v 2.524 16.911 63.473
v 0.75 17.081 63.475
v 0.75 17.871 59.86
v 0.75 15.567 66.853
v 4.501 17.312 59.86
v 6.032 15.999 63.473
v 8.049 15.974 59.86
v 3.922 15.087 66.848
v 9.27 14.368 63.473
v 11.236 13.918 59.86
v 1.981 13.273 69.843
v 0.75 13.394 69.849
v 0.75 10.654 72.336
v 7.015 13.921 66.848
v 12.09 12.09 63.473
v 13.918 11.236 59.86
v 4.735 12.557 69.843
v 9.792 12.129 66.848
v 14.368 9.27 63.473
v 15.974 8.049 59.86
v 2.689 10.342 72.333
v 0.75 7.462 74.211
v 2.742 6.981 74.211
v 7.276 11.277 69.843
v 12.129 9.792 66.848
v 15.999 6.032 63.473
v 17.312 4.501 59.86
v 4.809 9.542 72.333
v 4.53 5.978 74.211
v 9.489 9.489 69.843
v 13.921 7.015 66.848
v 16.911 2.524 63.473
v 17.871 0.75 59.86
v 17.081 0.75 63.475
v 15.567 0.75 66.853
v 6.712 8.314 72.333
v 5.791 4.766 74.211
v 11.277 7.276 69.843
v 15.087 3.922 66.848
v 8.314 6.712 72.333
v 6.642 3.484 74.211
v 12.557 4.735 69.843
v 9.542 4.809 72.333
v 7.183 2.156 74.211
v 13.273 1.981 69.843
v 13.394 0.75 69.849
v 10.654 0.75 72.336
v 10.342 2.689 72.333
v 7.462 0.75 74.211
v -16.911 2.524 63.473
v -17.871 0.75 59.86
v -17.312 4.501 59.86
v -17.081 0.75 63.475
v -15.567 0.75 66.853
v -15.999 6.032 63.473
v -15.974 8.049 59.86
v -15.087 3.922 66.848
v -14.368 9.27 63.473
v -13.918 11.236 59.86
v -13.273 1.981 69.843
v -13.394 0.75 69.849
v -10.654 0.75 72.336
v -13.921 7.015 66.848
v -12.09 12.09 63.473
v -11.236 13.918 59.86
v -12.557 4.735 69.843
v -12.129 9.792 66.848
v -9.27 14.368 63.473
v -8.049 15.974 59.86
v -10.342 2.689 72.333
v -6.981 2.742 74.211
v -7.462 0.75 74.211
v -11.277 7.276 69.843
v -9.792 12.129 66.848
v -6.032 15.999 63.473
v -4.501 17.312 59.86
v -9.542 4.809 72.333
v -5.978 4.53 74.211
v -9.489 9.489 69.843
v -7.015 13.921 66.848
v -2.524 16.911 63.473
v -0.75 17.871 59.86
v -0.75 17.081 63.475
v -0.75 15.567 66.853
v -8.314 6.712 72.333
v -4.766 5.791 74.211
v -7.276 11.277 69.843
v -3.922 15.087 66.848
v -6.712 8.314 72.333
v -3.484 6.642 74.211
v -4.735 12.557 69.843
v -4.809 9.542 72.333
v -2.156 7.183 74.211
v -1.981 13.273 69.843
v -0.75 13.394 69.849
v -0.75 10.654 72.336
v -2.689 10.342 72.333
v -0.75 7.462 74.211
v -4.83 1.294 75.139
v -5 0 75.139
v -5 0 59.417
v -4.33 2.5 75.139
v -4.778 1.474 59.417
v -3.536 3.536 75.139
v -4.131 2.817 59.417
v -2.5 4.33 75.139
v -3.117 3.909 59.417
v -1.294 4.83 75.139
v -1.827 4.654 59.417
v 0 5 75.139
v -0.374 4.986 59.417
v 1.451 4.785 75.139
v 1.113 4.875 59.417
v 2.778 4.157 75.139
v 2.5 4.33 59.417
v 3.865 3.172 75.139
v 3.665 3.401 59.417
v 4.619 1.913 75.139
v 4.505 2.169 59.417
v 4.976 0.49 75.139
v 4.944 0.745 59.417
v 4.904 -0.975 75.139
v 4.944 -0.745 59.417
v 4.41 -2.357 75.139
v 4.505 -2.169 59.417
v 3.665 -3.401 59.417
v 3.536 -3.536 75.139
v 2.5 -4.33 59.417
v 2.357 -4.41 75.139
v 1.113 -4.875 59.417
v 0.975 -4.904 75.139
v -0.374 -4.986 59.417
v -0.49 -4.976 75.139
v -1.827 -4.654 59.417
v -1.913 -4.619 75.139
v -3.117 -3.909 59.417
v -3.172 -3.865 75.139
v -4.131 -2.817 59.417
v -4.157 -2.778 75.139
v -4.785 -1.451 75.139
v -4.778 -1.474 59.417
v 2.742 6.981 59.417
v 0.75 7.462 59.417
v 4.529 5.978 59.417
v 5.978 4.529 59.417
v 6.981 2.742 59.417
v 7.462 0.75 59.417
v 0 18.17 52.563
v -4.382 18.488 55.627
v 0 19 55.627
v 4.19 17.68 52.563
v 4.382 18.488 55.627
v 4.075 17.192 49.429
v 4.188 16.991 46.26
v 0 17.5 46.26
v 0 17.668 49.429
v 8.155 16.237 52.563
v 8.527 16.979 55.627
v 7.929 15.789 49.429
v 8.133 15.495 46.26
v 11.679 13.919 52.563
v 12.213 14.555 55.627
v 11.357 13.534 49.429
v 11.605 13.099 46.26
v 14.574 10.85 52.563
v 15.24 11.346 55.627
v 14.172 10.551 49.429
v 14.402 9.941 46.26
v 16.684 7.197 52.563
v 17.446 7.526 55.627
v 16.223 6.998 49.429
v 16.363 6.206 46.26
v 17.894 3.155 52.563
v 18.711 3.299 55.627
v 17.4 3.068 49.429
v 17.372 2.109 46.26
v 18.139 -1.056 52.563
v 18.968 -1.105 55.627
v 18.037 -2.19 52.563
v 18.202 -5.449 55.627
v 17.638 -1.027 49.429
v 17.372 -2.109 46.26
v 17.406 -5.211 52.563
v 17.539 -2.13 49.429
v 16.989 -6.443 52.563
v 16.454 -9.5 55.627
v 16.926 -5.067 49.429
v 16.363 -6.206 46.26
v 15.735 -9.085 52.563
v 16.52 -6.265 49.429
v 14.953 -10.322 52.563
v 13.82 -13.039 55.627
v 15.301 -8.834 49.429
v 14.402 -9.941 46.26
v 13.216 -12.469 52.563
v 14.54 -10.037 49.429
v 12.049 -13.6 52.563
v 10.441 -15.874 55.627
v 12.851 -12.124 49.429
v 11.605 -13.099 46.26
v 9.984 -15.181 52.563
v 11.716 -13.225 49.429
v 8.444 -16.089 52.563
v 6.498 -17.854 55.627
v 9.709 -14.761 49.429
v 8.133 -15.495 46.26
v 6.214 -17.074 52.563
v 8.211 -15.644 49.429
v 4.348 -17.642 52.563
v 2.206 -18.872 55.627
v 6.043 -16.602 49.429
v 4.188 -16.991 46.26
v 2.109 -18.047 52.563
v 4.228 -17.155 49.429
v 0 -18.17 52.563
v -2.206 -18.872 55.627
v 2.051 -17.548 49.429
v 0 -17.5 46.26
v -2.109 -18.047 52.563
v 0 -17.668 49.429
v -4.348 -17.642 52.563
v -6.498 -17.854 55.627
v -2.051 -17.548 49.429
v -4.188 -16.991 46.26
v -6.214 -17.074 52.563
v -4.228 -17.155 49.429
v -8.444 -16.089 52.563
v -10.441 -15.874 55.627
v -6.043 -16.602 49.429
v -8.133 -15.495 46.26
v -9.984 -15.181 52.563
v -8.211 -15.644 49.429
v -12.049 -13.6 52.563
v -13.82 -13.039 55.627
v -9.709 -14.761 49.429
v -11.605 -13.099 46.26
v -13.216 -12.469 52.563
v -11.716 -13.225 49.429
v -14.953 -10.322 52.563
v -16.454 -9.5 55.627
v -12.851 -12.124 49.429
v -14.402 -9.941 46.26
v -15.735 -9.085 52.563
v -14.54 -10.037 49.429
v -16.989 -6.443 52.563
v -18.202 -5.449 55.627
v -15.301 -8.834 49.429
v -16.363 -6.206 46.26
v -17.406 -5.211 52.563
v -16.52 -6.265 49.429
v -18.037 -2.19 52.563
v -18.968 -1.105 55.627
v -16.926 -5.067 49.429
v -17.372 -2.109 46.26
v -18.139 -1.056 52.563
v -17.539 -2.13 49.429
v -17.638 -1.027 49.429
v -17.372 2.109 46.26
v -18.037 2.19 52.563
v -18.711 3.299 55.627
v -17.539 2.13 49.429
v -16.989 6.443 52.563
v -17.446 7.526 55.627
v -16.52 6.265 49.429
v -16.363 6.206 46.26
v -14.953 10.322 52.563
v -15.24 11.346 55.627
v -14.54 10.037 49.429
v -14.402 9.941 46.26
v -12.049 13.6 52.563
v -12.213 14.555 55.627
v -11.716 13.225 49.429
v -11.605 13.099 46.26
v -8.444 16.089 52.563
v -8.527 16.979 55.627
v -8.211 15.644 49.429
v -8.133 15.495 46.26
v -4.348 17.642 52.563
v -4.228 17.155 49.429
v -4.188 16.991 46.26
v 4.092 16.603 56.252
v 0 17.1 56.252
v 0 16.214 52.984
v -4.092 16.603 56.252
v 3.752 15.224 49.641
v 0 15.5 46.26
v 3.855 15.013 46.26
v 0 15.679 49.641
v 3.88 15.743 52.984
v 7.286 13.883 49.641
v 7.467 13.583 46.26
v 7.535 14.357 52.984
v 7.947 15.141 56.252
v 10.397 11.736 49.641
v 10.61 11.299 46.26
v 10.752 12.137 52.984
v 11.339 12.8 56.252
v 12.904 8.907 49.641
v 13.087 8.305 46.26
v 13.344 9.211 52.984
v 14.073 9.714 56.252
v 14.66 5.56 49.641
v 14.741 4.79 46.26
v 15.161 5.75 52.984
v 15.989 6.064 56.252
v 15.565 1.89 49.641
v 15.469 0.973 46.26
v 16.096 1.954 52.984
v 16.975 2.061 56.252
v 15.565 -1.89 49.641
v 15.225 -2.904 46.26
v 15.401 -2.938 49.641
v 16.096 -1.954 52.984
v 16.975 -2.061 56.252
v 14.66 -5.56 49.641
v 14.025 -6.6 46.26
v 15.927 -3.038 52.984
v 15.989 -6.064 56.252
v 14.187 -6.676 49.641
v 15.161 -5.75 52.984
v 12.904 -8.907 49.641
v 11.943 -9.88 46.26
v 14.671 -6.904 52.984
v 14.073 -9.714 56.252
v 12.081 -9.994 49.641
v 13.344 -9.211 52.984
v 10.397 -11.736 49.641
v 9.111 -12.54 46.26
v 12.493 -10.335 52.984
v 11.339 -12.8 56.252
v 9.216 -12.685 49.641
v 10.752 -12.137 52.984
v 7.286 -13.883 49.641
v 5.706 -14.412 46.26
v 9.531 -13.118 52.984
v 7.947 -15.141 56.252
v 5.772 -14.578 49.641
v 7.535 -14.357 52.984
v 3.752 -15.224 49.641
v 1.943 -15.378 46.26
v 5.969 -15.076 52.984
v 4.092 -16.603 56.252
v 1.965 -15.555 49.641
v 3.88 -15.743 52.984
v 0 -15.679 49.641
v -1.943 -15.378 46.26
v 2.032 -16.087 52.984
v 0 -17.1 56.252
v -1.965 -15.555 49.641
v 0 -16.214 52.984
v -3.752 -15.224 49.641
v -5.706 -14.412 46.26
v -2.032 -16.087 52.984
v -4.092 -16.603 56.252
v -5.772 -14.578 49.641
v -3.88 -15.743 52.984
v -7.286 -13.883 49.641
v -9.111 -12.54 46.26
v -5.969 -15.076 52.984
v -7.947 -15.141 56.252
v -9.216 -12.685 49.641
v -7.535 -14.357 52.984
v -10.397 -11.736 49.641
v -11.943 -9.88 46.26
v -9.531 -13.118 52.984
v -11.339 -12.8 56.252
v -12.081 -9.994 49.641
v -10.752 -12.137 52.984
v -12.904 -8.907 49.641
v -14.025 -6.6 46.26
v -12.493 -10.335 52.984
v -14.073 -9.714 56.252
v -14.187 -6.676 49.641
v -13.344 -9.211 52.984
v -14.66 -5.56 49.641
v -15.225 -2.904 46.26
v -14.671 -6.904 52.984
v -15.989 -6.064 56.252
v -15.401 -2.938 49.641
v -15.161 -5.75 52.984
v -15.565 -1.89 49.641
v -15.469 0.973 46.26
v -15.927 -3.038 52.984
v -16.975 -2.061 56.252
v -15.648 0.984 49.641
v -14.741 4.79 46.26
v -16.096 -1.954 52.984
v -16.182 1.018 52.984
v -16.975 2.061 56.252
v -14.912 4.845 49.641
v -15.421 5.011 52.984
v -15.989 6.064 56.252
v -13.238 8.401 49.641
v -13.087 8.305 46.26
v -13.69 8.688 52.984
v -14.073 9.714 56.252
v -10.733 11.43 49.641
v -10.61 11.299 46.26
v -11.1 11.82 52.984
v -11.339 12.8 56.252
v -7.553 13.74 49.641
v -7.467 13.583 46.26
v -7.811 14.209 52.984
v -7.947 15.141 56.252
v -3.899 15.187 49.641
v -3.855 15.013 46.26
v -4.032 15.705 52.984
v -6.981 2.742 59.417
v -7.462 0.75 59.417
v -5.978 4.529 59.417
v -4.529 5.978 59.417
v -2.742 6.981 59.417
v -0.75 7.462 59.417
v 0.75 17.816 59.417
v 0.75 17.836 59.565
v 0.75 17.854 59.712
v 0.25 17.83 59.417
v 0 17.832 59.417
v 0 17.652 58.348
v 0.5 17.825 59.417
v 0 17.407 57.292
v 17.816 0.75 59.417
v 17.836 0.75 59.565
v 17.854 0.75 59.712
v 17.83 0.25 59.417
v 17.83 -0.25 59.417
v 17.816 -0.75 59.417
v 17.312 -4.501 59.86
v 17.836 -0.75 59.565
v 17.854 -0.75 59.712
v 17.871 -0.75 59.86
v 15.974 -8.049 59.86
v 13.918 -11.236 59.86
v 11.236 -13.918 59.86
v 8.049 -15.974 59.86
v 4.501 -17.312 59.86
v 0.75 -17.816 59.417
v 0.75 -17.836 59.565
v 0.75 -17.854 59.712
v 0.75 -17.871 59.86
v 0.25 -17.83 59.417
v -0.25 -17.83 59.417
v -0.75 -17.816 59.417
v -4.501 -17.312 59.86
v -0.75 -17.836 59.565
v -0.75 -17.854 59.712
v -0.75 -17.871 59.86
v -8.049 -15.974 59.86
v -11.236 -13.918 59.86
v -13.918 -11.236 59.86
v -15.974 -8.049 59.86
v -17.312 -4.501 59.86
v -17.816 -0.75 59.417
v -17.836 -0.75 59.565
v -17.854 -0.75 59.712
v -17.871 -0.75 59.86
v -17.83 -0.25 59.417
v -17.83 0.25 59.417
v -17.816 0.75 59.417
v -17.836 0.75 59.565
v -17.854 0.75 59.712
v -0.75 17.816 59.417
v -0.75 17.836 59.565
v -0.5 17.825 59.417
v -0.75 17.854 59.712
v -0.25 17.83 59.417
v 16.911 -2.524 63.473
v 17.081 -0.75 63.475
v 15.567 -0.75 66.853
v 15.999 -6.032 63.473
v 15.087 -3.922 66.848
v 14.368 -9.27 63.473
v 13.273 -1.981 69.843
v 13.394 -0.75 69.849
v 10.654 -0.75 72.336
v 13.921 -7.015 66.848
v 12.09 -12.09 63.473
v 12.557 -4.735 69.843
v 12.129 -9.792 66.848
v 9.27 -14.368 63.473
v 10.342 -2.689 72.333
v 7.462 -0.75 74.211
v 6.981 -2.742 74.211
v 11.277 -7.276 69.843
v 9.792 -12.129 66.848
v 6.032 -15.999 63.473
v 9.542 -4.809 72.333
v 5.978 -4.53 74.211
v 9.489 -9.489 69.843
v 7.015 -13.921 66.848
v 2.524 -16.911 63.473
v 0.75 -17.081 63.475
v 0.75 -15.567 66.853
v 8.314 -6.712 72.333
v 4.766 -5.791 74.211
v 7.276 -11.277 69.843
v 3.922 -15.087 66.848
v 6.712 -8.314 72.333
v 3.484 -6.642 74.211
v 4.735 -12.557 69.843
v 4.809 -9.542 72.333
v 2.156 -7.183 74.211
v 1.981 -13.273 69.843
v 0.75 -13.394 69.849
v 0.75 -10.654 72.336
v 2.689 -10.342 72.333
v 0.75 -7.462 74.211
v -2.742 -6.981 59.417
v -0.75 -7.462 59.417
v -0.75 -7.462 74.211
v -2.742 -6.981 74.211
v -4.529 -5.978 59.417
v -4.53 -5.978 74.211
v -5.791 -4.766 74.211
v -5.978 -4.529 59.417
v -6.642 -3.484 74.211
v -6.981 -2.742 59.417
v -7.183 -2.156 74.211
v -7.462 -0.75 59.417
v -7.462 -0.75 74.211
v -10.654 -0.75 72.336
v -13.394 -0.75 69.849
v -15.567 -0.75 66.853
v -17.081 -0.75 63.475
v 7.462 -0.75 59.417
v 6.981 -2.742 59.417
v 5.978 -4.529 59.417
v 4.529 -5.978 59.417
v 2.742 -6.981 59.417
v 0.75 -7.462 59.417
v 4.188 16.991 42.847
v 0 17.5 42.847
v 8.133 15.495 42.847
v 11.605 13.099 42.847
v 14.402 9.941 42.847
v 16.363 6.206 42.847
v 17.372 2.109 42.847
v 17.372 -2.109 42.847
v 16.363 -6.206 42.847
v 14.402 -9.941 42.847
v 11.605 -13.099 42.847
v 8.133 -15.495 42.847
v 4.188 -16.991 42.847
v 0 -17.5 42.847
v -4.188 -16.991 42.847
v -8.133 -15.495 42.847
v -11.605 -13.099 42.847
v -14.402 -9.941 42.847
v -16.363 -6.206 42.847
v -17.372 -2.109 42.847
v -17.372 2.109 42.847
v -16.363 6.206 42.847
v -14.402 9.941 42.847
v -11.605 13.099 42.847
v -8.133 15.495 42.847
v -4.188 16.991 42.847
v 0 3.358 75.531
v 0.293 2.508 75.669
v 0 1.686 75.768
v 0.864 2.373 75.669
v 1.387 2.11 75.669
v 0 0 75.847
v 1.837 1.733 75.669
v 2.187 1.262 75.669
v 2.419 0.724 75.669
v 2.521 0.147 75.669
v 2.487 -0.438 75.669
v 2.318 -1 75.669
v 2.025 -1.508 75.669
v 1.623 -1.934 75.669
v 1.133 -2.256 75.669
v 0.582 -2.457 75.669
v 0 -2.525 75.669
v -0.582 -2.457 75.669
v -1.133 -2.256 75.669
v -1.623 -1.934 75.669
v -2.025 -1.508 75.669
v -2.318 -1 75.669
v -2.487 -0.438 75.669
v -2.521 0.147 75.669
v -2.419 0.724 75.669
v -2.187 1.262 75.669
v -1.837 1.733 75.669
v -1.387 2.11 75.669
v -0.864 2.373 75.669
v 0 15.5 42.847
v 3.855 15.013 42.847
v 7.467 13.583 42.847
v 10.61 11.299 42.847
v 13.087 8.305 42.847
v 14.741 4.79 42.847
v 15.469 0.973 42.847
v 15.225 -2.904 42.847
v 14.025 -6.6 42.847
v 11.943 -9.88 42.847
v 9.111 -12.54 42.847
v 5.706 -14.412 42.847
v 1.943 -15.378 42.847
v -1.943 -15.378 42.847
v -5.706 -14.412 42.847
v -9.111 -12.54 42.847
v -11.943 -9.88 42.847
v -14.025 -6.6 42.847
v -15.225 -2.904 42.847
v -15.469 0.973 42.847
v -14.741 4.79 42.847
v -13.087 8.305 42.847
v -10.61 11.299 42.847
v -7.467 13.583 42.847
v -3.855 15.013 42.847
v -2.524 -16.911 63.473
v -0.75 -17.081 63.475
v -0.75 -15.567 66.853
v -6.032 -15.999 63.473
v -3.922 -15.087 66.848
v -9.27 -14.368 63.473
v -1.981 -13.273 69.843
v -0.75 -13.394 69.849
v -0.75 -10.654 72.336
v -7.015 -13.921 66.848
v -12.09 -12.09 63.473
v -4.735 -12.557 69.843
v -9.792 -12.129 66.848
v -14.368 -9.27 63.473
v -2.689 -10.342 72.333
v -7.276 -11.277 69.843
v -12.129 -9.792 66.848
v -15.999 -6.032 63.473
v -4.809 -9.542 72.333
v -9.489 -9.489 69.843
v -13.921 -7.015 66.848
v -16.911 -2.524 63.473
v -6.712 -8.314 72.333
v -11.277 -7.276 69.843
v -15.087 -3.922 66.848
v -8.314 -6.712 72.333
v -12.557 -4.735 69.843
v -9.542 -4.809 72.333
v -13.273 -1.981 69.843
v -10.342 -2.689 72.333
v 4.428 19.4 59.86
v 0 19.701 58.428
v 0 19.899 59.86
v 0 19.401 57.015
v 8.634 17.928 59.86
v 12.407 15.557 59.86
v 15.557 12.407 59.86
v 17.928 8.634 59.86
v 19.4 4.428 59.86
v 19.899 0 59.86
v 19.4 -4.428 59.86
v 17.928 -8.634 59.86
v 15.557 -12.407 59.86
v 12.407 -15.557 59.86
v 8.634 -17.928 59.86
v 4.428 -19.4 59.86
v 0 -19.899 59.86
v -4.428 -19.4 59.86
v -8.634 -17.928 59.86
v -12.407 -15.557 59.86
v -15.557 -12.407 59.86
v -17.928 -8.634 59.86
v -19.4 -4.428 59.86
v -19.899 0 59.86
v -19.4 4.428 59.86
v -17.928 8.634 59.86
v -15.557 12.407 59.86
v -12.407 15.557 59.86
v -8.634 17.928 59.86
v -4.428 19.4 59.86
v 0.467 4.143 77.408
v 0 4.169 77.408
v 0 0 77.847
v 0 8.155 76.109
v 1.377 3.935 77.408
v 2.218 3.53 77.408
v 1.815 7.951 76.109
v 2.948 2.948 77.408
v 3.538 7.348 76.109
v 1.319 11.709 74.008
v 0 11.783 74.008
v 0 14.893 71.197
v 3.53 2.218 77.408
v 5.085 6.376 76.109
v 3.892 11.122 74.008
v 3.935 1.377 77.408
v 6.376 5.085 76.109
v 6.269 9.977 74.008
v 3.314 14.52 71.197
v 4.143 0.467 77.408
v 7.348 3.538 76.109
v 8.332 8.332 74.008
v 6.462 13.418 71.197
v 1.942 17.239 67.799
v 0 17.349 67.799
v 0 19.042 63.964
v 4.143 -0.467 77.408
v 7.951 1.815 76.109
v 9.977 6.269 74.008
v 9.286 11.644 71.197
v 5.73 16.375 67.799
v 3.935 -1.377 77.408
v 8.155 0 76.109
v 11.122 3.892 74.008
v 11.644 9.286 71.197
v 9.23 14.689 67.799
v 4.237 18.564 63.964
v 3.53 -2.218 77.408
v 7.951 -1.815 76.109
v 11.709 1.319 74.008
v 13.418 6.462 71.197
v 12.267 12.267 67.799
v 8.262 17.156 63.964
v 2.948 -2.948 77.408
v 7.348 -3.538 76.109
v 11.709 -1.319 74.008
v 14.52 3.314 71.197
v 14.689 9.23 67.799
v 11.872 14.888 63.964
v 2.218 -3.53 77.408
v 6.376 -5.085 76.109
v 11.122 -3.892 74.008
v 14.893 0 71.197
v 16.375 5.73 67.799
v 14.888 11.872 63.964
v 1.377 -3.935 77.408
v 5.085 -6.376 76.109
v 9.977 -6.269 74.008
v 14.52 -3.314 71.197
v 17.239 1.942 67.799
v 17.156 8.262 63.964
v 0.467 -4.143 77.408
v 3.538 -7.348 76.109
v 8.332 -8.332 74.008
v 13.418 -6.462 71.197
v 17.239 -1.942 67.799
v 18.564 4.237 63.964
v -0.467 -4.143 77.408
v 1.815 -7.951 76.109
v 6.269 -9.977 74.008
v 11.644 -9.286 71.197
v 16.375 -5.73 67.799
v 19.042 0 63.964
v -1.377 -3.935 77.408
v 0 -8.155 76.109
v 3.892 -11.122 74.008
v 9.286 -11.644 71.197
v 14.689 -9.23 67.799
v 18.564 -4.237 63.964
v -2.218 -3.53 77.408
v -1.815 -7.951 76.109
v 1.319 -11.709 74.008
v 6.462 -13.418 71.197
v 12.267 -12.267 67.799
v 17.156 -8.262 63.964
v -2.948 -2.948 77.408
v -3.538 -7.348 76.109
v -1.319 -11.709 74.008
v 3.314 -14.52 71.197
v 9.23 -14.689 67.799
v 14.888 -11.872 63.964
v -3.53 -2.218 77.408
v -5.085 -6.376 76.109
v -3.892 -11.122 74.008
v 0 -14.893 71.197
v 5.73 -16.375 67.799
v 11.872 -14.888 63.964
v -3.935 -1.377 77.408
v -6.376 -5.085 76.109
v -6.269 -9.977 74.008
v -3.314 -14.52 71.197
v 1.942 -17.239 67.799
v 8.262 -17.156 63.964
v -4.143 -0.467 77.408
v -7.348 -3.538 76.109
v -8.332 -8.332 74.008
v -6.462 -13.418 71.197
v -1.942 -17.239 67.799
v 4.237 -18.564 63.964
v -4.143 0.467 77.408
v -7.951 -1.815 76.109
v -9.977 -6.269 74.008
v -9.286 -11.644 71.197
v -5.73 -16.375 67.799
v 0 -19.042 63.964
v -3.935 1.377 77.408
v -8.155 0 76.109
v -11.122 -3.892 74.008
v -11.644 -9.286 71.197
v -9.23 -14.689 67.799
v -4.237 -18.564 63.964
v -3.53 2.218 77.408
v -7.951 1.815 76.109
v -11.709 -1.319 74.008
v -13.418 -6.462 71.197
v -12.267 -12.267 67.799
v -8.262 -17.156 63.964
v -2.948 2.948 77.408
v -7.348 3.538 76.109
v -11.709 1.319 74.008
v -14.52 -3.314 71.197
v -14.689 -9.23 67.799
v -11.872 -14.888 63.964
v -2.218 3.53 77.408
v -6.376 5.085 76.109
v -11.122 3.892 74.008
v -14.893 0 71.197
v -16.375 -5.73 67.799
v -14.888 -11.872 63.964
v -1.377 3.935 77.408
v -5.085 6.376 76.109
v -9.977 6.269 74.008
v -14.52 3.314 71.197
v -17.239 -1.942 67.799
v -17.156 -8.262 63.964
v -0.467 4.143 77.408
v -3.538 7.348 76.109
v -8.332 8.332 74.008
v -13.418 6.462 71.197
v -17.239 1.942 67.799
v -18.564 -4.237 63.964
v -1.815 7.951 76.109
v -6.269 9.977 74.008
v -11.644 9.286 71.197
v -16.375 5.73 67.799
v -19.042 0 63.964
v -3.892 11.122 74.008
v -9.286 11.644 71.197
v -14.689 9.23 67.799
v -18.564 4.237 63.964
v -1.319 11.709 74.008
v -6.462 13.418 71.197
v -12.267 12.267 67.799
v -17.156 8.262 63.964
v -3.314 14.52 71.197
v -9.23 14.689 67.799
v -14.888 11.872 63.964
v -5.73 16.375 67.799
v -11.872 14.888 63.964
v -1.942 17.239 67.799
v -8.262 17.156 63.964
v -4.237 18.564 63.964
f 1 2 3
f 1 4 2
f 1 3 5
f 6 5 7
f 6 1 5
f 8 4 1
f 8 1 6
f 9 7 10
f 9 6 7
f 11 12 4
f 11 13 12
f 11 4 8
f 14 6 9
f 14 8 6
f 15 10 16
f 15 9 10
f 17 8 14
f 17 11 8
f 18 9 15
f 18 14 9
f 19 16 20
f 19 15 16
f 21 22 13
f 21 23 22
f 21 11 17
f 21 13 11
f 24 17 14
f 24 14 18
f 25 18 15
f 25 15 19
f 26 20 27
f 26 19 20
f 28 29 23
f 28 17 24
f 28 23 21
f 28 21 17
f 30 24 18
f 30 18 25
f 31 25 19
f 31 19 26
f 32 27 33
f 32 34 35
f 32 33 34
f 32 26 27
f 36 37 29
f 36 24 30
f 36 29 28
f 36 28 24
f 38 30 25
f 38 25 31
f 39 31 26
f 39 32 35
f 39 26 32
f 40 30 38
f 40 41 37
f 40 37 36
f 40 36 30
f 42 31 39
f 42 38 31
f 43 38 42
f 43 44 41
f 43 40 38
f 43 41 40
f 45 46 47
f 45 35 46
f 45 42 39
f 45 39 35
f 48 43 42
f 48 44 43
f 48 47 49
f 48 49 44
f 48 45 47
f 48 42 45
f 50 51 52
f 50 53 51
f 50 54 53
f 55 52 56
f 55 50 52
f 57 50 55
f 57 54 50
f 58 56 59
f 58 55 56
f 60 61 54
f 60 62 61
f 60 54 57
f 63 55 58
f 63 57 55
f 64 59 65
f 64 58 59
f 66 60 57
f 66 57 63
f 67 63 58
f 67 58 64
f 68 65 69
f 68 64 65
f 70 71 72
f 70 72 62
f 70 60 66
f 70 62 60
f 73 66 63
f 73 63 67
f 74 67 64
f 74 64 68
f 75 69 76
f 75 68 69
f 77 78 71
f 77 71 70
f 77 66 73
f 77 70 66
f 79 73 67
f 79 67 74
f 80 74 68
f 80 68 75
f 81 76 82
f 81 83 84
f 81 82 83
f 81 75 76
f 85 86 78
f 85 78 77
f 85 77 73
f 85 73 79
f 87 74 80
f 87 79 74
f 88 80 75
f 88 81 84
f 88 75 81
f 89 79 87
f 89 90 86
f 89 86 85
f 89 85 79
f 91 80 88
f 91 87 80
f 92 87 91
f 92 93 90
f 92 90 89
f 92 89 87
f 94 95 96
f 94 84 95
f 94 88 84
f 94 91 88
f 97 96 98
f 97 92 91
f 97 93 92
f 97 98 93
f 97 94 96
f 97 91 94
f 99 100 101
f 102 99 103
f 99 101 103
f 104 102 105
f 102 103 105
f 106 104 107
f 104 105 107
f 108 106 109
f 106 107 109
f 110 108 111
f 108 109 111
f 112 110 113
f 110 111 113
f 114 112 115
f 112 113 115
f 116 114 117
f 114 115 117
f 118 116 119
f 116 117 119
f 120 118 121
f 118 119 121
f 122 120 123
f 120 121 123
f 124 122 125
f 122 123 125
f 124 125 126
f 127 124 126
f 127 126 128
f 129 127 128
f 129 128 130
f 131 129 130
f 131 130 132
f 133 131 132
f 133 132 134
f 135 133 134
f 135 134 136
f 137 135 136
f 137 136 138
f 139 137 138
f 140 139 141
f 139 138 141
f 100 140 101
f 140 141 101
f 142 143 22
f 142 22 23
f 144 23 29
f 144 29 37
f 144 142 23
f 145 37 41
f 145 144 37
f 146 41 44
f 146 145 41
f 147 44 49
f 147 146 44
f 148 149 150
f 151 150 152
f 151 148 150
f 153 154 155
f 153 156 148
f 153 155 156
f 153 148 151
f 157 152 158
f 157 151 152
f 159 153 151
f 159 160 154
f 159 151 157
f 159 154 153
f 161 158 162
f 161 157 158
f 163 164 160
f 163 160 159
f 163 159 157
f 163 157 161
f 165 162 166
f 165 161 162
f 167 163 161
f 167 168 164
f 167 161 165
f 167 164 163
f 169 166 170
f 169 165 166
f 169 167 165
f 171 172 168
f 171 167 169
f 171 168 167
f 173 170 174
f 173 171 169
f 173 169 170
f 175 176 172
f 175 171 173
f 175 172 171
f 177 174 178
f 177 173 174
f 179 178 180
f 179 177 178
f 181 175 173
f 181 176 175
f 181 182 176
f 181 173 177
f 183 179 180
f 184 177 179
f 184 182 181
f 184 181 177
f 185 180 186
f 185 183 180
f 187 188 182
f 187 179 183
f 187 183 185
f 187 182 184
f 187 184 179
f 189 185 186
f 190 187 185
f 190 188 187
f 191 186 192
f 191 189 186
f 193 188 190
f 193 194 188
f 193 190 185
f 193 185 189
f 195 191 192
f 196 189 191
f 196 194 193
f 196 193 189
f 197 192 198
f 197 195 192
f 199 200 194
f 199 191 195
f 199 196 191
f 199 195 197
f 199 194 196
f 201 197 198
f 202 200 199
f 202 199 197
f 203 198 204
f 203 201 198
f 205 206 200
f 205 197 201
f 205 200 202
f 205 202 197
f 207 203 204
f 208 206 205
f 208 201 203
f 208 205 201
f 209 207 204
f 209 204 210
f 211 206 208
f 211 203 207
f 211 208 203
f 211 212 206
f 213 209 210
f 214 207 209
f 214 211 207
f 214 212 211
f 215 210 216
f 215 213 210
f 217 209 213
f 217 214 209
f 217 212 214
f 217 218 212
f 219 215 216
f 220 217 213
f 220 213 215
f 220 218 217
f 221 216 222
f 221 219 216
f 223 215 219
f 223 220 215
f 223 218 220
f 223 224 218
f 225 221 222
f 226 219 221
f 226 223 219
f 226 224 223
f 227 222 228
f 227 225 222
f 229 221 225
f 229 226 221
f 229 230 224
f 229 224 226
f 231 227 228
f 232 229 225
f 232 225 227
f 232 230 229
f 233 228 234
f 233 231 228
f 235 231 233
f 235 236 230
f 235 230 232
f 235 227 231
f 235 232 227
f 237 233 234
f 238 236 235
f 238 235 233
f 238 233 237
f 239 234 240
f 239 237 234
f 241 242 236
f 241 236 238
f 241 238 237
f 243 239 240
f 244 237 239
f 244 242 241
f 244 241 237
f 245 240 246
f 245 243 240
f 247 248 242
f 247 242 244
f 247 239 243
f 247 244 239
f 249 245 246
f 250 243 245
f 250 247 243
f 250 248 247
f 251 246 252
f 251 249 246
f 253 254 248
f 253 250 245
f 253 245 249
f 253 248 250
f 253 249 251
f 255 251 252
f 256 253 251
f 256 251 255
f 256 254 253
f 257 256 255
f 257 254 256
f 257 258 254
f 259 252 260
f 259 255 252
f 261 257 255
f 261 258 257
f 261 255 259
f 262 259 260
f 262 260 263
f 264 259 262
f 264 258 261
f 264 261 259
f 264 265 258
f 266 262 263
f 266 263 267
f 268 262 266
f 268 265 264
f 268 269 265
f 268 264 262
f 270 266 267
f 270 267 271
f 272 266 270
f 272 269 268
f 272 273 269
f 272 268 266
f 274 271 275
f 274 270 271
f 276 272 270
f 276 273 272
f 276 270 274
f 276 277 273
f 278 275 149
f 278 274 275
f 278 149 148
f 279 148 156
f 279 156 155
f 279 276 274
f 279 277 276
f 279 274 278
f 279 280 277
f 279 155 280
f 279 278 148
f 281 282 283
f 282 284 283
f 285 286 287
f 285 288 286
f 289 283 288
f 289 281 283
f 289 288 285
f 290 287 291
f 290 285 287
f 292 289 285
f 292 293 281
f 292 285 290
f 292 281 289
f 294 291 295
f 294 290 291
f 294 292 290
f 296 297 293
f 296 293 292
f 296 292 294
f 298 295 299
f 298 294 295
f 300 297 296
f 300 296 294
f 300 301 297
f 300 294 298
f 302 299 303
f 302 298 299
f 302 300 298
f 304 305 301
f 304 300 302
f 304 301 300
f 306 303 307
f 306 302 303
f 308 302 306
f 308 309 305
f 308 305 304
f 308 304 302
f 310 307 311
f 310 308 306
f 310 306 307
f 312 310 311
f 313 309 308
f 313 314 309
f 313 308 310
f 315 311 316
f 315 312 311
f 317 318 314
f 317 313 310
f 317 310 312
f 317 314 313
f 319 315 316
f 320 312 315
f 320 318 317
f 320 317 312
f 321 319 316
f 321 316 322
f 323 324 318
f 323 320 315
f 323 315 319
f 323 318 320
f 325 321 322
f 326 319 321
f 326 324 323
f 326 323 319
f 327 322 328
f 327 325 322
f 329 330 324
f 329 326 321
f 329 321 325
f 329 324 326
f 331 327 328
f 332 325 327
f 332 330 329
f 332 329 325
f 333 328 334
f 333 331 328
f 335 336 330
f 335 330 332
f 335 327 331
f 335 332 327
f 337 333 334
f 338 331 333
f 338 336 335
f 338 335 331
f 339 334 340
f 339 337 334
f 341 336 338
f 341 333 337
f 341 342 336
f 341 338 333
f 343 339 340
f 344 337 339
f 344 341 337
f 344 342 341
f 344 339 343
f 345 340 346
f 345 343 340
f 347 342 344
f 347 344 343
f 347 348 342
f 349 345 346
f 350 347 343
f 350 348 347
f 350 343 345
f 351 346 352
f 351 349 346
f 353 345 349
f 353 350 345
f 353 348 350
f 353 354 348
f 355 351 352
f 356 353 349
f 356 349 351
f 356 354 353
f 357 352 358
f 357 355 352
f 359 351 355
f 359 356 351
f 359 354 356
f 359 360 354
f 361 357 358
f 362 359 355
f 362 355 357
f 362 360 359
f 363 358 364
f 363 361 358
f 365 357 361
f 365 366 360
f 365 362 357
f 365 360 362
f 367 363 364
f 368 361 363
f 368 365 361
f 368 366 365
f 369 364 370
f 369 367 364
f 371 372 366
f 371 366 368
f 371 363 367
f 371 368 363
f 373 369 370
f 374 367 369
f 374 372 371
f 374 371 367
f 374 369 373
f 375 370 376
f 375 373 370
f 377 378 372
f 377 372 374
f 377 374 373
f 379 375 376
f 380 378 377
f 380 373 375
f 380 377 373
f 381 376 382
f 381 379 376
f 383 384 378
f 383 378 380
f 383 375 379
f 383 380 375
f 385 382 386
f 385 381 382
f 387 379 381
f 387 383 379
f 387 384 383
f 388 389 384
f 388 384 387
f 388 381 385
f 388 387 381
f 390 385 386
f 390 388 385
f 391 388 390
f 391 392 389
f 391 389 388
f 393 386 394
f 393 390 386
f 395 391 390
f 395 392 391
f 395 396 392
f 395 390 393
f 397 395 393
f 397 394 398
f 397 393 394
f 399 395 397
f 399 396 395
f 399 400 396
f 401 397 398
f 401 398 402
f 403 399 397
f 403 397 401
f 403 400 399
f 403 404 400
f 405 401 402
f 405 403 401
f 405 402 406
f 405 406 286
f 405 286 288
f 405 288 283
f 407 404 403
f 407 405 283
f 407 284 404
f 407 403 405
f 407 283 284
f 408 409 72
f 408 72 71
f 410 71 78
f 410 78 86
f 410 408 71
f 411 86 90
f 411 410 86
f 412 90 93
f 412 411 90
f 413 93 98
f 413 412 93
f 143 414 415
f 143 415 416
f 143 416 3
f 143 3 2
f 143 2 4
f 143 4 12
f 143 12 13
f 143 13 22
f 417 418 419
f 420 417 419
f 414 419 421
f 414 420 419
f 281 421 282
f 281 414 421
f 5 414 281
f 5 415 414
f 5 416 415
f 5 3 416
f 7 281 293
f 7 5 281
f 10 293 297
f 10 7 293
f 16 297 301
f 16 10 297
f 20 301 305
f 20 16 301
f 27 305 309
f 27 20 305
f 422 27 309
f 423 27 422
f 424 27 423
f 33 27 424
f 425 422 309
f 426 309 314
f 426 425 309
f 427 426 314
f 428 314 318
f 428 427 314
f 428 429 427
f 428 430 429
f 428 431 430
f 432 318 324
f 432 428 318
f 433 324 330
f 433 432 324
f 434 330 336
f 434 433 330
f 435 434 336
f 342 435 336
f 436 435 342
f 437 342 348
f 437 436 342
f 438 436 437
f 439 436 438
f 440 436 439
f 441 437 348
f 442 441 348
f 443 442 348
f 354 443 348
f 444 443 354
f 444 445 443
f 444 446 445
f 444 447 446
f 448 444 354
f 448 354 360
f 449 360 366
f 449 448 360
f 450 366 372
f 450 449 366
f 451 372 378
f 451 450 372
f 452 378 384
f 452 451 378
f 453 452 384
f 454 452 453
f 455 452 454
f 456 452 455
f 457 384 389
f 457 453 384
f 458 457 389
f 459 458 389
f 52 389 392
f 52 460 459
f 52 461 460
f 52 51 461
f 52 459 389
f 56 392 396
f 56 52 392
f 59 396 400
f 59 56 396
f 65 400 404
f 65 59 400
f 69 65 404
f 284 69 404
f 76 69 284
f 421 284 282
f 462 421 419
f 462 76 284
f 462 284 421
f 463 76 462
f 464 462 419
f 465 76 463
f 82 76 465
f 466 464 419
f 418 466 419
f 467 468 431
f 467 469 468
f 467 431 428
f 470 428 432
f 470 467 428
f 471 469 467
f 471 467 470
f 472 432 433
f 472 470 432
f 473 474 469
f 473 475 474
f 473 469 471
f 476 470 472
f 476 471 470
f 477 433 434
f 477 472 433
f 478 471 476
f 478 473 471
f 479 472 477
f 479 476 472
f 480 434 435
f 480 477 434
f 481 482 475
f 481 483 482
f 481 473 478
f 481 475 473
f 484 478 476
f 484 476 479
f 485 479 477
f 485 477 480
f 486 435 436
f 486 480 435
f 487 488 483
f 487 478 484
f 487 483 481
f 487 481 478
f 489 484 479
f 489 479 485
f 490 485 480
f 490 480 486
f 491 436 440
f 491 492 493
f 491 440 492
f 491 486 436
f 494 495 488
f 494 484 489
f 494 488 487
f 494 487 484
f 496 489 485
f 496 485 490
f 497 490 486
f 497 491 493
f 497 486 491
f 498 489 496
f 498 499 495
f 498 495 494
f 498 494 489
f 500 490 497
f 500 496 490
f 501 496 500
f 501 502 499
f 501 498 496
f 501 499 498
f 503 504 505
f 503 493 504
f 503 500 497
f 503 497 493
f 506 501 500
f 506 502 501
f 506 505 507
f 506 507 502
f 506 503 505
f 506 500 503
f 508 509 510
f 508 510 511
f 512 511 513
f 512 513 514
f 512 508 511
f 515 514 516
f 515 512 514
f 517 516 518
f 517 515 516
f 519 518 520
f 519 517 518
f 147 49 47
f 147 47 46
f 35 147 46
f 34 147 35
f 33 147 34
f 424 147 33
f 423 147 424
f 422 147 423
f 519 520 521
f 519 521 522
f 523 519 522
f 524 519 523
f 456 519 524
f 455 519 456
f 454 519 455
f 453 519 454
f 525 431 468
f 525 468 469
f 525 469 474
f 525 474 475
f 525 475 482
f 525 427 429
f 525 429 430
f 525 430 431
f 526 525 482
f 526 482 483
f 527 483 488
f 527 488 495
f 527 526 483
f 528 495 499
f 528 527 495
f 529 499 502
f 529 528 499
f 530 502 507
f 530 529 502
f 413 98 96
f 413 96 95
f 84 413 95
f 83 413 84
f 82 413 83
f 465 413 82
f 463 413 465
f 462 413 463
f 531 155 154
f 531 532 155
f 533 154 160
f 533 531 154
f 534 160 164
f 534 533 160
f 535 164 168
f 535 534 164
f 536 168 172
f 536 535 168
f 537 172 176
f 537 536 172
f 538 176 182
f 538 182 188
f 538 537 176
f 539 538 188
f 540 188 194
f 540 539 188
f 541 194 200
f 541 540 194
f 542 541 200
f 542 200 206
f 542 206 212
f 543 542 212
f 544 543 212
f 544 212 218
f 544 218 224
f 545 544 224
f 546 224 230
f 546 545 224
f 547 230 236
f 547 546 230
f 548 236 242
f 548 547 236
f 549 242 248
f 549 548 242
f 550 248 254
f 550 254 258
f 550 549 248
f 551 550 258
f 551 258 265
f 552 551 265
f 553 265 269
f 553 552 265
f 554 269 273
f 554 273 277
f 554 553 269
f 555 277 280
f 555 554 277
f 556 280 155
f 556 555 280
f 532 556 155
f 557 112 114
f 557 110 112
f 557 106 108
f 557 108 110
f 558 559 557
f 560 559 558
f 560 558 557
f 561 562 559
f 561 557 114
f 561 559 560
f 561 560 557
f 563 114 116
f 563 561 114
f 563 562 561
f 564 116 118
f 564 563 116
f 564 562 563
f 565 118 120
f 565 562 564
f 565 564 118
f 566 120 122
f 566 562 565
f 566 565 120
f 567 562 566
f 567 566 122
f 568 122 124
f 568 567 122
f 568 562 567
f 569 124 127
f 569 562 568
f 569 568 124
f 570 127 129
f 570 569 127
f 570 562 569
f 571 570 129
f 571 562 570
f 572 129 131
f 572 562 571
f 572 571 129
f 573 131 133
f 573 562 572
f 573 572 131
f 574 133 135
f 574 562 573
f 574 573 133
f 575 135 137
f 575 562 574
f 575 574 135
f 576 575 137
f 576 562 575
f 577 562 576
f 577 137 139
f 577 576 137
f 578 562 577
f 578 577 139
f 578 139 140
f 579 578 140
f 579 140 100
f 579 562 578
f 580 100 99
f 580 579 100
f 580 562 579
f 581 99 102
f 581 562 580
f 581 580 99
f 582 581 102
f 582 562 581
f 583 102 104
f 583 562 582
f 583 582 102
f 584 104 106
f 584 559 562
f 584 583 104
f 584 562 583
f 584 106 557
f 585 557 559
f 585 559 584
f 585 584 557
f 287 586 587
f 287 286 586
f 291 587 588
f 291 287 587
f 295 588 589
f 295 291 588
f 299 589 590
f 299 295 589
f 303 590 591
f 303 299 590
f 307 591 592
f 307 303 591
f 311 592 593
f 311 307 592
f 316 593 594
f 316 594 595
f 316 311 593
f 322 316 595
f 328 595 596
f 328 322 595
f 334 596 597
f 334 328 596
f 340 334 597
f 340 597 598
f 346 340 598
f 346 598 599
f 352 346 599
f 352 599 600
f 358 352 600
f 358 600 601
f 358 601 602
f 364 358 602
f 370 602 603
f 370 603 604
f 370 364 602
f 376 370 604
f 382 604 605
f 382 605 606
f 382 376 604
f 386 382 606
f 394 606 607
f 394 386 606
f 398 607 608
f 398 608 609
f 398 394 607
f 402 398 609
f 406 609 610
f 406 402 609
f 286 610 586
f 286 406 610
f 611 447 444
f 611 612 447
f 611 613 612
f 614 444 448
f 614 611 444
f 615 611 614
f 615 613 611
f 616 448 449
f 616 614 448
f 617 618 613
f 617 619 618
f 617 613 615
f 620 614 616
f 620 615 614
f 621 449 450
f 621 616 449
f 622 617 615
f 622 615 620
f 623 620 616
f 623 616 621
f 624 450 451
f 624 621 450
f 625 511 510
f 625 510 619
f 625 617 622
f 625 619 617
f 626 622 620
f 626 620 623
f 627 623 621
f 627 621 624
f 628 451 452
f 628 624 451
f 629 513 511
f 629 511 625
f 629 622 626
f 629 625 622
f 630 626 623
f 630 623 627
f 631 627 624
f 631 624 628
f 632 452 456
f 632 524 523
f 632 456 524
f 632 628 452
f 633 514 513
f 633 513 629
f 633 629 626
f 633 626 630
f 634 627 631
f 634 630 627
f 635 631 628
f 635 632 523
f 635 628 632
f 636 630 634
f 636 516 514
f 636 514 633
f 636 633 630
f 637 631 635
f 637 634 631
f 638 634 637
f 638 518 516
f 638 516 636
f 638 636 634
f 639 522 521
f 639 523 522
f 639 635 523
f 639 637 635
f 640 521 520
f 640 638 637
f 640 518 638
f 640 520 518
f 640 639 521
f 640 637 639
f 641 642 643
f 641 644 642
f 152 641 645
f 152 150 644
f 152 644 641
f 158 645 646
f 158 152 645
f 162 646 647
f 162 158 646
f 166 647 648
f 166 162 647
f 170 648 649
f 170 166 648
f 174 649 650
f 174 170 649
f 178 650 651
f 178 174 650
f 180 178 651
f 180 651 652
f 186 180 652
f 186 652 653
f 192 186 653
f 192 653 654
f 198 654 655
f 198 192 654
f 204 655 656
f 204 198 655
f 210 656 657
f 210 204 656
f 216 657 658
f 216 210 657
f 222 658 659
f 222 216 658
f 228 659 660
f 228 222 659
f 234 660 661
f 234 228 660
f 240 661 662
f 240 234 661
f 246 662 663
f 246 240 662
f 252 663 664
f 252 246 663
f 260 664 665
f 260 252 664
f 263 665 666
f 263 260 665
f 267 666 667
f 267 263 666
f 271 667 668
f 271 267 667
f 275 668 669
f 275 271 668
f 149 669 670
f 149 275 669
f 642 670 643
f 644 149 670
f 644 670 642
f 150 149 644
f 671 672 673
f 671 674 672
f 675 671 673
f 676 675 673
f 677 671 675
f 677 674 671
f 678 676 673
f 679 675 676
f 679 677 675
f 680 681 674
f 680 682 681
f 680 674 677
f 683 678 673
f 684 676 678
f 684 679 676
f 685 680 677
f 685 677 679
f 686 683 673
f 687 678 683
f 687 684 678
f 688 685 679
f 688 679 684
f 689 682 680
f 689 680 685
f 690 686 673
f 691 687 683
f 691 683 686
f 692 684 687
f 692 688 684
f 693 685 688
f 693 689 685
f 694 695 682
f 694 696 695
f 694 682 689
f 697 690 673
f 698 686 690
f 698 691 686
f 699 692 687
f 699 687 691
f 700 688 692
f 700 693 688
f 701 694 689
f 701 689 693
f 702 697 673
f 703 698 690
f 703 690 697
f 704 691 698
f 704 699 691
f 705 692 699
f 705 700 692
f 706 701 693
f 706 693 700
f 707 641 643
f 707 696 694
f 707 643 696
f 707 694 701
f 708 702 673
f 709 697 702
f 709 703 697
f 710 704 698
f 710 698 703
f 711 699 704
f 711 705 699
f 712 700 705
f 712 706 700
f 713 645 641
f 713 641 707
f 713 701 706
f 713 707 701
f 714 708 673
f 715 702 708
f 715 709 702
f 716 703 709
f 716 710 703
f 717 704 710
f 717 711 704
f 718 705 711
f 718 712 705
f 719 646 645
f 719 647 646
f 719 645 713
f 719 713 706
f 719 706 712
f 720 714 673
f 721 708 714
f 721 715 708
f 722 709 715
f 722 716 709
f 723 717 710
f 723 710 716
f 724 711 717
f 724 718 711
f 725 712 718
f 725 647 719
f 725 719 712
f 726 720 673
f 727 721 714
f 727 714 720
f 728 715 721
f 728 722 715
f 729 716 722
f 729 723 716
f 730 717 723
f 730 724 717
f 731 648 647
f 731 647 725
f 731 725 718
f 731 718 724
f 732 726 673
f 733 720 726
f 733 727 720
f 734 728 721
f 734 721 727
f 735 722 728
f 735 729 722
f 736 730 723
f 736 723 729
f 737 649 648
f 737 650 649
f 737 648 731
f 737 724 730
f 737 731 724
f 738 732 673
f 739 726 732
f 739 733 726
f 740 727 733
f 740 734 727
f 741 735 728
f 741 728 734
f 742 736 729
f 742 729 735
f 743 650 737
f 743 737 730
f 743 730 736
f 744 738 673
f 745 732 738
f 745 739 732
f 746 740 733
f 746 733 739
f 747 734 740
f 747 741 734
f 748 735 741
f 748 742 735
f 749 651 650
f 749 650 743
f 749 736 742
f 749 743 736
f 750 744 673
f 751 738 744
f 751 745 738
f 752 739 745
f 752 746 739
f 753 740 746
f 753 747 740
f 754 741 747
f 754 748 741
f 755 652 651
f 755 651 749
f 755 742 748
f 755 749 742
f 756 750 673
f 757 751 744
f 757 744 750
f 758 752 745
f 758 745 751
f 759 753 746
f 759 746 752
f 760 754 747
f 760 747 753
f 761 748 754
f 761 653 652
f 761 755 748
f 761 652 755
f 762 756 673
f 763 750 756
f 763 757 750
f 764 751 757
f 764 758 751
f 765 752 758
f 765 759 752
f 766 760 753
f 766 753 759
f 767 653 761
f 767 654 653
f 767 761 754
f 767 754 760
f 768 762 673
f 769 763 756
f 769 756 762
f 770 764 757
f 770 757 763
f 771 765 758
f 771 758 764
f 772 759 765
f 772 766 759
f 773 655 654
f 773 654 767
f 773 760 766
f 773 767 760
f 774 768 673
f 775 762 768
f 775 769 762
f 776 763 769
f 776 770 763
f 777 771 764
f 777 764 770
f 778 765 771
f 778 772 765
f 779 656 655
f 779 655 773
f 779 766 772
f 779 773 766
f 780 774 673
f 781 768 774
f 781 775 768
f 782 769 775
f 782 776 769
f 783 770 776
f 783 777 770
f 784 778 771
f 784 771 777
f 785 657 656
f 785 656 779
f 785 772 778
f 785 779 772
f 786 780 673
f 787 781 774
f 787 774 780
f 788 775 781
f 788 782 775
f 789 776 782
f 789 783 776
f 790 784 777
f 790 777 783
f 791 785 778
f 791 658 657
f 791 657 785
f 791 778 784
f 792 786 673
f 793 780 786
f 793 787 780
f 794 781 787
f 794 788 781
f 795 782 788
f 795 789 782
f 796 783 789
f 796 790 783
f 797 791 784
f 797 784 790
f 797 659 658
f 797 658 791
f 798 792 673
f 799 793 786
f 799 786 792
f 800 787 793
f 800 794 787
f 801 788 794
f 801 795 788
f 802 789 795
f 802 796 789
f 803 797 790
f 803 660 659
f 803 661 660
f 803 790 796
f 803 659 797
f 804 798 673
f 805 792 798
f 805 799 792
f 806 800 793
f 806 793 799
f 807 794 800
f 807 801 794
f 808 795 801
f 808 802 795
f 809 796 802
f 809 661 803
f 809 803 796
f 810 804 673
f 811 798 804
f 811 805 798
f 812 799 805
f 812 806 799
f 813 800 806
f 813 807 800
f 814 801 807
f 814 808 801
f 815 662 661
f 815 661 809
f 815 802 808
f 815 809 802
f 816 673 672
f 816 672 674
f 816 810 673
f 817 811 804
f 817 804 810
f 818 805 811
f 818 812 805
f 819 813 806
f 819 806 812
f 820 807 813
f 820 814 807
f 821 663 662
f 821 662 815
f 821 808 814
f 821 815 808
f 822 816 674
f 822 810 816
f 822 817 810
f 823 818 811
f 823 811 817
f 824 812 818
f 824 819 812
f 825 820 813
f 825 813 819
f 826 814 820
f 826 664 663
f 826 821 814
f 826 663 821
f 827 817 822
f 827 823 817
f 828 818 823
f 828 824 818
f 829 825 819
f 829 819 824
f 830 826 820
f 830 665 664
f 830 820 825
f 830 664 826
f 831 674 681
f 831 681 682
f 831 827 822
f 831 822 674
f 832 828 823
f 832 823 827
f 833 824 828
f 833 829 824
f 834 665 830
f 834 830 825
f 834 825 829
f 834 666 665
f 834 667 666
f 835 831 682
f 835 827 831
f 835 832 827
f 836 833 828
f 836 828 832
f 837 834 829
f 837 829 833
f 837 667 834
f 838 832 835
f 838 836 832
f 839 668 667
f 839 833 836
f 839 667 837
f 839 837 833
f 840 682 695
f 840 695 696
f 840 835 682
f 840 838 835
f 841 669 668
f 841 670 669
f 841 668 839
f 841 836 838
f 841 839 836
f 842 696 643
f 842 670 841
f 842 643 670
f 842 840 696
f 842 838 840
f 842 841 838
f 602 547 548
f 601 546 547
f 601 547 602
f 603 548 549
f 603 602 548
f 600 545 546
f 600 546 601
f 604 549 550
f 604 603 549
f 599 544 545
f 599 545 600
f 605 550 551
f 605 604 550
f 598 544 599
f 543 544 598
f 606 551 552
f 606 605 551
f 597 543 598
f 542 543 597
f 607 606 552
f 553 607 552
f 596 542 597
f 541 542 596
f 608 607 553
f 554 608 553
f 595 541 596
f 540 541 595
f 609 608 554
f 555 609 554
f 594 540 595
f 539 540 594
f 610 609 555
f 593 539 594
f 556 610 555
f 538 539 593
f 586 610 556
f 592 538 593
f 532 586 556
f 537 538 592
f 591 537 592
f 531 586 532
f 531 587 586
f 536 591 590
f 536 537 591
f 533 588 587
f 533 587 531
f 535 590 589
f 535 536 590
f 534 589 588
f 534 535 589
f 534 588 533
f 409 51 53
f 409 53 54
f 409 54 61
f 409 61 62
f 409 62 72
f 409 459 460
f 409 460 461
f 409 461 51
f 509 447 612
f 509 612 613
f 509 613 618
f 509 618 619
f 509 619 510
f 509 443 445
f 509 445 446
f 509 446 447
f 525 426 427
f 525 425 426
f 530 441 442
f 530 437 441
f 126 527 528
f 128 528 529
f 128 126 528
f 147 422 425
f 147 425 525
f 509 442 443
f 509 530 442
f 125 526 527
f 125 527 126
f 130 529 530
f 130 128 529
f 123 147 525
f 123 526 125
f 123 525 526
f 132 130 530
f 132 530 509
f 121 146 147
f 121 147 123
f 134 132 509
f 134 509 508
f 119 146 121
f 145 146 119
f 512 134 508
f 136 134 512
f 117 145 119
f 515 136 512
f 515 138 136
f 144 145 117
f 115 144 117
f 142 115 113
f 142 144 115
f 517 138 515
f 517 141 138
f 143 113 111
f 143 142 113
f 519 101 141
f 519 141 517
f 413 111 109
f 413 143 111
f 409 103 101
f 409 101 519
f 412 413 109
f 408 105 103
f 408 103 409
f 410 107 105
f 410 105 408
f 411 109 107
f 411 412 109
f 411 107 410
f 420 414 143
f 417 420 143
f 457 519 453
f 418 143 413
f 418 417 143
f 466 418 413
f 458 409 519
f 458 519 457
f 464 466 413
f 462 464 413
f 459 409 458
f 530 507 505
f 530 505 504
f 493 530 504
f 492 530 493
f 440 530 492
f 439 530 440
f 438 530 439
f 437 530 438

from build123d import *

# Parameters (mm, degrees)
ESTRUSIONE_ESTRUSIONE1_REACH      = 63.48
ESTRUSIONE_ESTRUSIONE1_END_RADIUS = 18
ESTRUSIONE_ESTRUSIONE1_START      = -16.57
SCHIZZO3_R                        = 5


with BuildPart() as part:
    # Schizzo1 → Rivoluzione1 (revolve)
    with BuildSketch(Plane(origin=(0, 0, 0), x_dir=(0, 0, -1), z_dir=(1, 0, 0))):
        with BuildLine():
            Line((-46.259570065, 17.5), (-42.84743692, 17.5))
            Line((-42.84743692, 17.5), (-42.84743692, 15.5))
            Line((-42.84743692, 15.5), (-46.259570065, 15.5))
            ThreePointArc((-46.259570065, 15.5), (-51.319214322, 15.902531747), (-56.251566863, 17.1))
            ThreePointArc((-56.251566863, 17.1), (-58.035417815, 17.58636227), (-59.85975099, 17.887162773))
            ThreePointArc((-59.85975099, 17.887162773), (-71.267974414, 11.995381335), (-75.84743692, 0))
            Line((-75.84743692, 0), (-77.84743692, 0))
            ThreePointArc((-77.84743692, 0), (-72.683984385, 13.411817897), (-59.85975099, 19.898507283))
            ThreePointArc((-59.85975099, 19.898507283), (-57.719038516, 19.56405813), (-55.627067063, 19))
            ThreePointArc((-55.627067063, 19), (-51.002986556, 17.877373513), (-46.259570065, 17.5))
        make_face()
    revolve(axis=Axis((0, 0, 77.84743692), (0, 0, -1)))

    # Estrusione-Estrusione1: up to this sphere (the profile starts inside it)
    estrusione_estrusione1_end = Location((0, 0, 57.84743692)) * Sphere(ESTRUSIONE_ESTRUSIONE1_END_RADIUS, mode=Mode.PRIVATE)
    # Schizzo3 → Estrusione-Estrusione1 (add, up to the surface)
    with BuildSketch(Plane(origin=(0, 0, 42.84743692), x_dir=(-1, 0, 0), z_dir=(0, 0, -1)).offset(ESTRUSIONE_ESTRUSIONE1_START), mode=Mode.PRIVATE) as estrusione_estrusione1_sk1:
        with BuildLine():
            Line((-17.87143229, -0.75), (-7.462405778, -0.75))
            ThreePointArc((-7.462405778, -0.75), (-5.303300859, -5.303300859), (-0.75, -7.462405778))
            Line((-0.75, -7.462405778), (-0.75, -17.87143229))
            ThreePointArc((-0.75, -17.87143229), (0, -17.887162773), (0.75, -17.87143229))
            Line((0.75, -17.87143229), (0.75, -7.462405778))
            ThreePointArc((0.75, -7.462405778), (5.303300859, -5.303300859), (7.462405778, -0.75))
            Line((7.462405778, -0.75), (17.87143229, -0.75))
            ThreePointArc((17.87143229, -0.75), (17.887162773, 0), (17.87143229, 0.75))
            Line((17.87143229, 0.75), (7.462405778, 0.75))
            ThreePointArc((7.462405778, 0.75), (5.303300859, 5.303300859), (0.75, 7.462405778))
            Line((0.75, 7.462405778), (0.75, 17.87143229))
            ThreePointArc((0.75, 17.87143229), (0, 17.887162773), (-0.75, 17.87143229))
            Line((-0.75, 17.87143229), (-0.75, 7.462405778))
            ThreePointArc((-0.75, 7.462405778), (-5.303300859, 5.303300859), (-7.462405778, 0.75))
            Line((-7.462405778, 0.75), (-17.87143229, 0.75))
            ThreePointArc((-17.87143229, 0.75), (-17.887162773, 0), (-17.87143229, -0.75))
        make_face()
        Circle(SCHIZZO3_R, mode=Mode.SUBTRACT)
    estrusione_estrusione1_tool1 = extrude(estrusione_estrusione1_sk1.sketch, amount=-ESTRUSIONE_ESTRUSIONE1_REACH, mode=Mode.PRIVATE) & estrusione_estrusione1_end
    add(estrusione_estrusione1_tool1.solids().sort_by_distance((12.666919, -0.244075, 59.417437))[0])


solid = part.part
